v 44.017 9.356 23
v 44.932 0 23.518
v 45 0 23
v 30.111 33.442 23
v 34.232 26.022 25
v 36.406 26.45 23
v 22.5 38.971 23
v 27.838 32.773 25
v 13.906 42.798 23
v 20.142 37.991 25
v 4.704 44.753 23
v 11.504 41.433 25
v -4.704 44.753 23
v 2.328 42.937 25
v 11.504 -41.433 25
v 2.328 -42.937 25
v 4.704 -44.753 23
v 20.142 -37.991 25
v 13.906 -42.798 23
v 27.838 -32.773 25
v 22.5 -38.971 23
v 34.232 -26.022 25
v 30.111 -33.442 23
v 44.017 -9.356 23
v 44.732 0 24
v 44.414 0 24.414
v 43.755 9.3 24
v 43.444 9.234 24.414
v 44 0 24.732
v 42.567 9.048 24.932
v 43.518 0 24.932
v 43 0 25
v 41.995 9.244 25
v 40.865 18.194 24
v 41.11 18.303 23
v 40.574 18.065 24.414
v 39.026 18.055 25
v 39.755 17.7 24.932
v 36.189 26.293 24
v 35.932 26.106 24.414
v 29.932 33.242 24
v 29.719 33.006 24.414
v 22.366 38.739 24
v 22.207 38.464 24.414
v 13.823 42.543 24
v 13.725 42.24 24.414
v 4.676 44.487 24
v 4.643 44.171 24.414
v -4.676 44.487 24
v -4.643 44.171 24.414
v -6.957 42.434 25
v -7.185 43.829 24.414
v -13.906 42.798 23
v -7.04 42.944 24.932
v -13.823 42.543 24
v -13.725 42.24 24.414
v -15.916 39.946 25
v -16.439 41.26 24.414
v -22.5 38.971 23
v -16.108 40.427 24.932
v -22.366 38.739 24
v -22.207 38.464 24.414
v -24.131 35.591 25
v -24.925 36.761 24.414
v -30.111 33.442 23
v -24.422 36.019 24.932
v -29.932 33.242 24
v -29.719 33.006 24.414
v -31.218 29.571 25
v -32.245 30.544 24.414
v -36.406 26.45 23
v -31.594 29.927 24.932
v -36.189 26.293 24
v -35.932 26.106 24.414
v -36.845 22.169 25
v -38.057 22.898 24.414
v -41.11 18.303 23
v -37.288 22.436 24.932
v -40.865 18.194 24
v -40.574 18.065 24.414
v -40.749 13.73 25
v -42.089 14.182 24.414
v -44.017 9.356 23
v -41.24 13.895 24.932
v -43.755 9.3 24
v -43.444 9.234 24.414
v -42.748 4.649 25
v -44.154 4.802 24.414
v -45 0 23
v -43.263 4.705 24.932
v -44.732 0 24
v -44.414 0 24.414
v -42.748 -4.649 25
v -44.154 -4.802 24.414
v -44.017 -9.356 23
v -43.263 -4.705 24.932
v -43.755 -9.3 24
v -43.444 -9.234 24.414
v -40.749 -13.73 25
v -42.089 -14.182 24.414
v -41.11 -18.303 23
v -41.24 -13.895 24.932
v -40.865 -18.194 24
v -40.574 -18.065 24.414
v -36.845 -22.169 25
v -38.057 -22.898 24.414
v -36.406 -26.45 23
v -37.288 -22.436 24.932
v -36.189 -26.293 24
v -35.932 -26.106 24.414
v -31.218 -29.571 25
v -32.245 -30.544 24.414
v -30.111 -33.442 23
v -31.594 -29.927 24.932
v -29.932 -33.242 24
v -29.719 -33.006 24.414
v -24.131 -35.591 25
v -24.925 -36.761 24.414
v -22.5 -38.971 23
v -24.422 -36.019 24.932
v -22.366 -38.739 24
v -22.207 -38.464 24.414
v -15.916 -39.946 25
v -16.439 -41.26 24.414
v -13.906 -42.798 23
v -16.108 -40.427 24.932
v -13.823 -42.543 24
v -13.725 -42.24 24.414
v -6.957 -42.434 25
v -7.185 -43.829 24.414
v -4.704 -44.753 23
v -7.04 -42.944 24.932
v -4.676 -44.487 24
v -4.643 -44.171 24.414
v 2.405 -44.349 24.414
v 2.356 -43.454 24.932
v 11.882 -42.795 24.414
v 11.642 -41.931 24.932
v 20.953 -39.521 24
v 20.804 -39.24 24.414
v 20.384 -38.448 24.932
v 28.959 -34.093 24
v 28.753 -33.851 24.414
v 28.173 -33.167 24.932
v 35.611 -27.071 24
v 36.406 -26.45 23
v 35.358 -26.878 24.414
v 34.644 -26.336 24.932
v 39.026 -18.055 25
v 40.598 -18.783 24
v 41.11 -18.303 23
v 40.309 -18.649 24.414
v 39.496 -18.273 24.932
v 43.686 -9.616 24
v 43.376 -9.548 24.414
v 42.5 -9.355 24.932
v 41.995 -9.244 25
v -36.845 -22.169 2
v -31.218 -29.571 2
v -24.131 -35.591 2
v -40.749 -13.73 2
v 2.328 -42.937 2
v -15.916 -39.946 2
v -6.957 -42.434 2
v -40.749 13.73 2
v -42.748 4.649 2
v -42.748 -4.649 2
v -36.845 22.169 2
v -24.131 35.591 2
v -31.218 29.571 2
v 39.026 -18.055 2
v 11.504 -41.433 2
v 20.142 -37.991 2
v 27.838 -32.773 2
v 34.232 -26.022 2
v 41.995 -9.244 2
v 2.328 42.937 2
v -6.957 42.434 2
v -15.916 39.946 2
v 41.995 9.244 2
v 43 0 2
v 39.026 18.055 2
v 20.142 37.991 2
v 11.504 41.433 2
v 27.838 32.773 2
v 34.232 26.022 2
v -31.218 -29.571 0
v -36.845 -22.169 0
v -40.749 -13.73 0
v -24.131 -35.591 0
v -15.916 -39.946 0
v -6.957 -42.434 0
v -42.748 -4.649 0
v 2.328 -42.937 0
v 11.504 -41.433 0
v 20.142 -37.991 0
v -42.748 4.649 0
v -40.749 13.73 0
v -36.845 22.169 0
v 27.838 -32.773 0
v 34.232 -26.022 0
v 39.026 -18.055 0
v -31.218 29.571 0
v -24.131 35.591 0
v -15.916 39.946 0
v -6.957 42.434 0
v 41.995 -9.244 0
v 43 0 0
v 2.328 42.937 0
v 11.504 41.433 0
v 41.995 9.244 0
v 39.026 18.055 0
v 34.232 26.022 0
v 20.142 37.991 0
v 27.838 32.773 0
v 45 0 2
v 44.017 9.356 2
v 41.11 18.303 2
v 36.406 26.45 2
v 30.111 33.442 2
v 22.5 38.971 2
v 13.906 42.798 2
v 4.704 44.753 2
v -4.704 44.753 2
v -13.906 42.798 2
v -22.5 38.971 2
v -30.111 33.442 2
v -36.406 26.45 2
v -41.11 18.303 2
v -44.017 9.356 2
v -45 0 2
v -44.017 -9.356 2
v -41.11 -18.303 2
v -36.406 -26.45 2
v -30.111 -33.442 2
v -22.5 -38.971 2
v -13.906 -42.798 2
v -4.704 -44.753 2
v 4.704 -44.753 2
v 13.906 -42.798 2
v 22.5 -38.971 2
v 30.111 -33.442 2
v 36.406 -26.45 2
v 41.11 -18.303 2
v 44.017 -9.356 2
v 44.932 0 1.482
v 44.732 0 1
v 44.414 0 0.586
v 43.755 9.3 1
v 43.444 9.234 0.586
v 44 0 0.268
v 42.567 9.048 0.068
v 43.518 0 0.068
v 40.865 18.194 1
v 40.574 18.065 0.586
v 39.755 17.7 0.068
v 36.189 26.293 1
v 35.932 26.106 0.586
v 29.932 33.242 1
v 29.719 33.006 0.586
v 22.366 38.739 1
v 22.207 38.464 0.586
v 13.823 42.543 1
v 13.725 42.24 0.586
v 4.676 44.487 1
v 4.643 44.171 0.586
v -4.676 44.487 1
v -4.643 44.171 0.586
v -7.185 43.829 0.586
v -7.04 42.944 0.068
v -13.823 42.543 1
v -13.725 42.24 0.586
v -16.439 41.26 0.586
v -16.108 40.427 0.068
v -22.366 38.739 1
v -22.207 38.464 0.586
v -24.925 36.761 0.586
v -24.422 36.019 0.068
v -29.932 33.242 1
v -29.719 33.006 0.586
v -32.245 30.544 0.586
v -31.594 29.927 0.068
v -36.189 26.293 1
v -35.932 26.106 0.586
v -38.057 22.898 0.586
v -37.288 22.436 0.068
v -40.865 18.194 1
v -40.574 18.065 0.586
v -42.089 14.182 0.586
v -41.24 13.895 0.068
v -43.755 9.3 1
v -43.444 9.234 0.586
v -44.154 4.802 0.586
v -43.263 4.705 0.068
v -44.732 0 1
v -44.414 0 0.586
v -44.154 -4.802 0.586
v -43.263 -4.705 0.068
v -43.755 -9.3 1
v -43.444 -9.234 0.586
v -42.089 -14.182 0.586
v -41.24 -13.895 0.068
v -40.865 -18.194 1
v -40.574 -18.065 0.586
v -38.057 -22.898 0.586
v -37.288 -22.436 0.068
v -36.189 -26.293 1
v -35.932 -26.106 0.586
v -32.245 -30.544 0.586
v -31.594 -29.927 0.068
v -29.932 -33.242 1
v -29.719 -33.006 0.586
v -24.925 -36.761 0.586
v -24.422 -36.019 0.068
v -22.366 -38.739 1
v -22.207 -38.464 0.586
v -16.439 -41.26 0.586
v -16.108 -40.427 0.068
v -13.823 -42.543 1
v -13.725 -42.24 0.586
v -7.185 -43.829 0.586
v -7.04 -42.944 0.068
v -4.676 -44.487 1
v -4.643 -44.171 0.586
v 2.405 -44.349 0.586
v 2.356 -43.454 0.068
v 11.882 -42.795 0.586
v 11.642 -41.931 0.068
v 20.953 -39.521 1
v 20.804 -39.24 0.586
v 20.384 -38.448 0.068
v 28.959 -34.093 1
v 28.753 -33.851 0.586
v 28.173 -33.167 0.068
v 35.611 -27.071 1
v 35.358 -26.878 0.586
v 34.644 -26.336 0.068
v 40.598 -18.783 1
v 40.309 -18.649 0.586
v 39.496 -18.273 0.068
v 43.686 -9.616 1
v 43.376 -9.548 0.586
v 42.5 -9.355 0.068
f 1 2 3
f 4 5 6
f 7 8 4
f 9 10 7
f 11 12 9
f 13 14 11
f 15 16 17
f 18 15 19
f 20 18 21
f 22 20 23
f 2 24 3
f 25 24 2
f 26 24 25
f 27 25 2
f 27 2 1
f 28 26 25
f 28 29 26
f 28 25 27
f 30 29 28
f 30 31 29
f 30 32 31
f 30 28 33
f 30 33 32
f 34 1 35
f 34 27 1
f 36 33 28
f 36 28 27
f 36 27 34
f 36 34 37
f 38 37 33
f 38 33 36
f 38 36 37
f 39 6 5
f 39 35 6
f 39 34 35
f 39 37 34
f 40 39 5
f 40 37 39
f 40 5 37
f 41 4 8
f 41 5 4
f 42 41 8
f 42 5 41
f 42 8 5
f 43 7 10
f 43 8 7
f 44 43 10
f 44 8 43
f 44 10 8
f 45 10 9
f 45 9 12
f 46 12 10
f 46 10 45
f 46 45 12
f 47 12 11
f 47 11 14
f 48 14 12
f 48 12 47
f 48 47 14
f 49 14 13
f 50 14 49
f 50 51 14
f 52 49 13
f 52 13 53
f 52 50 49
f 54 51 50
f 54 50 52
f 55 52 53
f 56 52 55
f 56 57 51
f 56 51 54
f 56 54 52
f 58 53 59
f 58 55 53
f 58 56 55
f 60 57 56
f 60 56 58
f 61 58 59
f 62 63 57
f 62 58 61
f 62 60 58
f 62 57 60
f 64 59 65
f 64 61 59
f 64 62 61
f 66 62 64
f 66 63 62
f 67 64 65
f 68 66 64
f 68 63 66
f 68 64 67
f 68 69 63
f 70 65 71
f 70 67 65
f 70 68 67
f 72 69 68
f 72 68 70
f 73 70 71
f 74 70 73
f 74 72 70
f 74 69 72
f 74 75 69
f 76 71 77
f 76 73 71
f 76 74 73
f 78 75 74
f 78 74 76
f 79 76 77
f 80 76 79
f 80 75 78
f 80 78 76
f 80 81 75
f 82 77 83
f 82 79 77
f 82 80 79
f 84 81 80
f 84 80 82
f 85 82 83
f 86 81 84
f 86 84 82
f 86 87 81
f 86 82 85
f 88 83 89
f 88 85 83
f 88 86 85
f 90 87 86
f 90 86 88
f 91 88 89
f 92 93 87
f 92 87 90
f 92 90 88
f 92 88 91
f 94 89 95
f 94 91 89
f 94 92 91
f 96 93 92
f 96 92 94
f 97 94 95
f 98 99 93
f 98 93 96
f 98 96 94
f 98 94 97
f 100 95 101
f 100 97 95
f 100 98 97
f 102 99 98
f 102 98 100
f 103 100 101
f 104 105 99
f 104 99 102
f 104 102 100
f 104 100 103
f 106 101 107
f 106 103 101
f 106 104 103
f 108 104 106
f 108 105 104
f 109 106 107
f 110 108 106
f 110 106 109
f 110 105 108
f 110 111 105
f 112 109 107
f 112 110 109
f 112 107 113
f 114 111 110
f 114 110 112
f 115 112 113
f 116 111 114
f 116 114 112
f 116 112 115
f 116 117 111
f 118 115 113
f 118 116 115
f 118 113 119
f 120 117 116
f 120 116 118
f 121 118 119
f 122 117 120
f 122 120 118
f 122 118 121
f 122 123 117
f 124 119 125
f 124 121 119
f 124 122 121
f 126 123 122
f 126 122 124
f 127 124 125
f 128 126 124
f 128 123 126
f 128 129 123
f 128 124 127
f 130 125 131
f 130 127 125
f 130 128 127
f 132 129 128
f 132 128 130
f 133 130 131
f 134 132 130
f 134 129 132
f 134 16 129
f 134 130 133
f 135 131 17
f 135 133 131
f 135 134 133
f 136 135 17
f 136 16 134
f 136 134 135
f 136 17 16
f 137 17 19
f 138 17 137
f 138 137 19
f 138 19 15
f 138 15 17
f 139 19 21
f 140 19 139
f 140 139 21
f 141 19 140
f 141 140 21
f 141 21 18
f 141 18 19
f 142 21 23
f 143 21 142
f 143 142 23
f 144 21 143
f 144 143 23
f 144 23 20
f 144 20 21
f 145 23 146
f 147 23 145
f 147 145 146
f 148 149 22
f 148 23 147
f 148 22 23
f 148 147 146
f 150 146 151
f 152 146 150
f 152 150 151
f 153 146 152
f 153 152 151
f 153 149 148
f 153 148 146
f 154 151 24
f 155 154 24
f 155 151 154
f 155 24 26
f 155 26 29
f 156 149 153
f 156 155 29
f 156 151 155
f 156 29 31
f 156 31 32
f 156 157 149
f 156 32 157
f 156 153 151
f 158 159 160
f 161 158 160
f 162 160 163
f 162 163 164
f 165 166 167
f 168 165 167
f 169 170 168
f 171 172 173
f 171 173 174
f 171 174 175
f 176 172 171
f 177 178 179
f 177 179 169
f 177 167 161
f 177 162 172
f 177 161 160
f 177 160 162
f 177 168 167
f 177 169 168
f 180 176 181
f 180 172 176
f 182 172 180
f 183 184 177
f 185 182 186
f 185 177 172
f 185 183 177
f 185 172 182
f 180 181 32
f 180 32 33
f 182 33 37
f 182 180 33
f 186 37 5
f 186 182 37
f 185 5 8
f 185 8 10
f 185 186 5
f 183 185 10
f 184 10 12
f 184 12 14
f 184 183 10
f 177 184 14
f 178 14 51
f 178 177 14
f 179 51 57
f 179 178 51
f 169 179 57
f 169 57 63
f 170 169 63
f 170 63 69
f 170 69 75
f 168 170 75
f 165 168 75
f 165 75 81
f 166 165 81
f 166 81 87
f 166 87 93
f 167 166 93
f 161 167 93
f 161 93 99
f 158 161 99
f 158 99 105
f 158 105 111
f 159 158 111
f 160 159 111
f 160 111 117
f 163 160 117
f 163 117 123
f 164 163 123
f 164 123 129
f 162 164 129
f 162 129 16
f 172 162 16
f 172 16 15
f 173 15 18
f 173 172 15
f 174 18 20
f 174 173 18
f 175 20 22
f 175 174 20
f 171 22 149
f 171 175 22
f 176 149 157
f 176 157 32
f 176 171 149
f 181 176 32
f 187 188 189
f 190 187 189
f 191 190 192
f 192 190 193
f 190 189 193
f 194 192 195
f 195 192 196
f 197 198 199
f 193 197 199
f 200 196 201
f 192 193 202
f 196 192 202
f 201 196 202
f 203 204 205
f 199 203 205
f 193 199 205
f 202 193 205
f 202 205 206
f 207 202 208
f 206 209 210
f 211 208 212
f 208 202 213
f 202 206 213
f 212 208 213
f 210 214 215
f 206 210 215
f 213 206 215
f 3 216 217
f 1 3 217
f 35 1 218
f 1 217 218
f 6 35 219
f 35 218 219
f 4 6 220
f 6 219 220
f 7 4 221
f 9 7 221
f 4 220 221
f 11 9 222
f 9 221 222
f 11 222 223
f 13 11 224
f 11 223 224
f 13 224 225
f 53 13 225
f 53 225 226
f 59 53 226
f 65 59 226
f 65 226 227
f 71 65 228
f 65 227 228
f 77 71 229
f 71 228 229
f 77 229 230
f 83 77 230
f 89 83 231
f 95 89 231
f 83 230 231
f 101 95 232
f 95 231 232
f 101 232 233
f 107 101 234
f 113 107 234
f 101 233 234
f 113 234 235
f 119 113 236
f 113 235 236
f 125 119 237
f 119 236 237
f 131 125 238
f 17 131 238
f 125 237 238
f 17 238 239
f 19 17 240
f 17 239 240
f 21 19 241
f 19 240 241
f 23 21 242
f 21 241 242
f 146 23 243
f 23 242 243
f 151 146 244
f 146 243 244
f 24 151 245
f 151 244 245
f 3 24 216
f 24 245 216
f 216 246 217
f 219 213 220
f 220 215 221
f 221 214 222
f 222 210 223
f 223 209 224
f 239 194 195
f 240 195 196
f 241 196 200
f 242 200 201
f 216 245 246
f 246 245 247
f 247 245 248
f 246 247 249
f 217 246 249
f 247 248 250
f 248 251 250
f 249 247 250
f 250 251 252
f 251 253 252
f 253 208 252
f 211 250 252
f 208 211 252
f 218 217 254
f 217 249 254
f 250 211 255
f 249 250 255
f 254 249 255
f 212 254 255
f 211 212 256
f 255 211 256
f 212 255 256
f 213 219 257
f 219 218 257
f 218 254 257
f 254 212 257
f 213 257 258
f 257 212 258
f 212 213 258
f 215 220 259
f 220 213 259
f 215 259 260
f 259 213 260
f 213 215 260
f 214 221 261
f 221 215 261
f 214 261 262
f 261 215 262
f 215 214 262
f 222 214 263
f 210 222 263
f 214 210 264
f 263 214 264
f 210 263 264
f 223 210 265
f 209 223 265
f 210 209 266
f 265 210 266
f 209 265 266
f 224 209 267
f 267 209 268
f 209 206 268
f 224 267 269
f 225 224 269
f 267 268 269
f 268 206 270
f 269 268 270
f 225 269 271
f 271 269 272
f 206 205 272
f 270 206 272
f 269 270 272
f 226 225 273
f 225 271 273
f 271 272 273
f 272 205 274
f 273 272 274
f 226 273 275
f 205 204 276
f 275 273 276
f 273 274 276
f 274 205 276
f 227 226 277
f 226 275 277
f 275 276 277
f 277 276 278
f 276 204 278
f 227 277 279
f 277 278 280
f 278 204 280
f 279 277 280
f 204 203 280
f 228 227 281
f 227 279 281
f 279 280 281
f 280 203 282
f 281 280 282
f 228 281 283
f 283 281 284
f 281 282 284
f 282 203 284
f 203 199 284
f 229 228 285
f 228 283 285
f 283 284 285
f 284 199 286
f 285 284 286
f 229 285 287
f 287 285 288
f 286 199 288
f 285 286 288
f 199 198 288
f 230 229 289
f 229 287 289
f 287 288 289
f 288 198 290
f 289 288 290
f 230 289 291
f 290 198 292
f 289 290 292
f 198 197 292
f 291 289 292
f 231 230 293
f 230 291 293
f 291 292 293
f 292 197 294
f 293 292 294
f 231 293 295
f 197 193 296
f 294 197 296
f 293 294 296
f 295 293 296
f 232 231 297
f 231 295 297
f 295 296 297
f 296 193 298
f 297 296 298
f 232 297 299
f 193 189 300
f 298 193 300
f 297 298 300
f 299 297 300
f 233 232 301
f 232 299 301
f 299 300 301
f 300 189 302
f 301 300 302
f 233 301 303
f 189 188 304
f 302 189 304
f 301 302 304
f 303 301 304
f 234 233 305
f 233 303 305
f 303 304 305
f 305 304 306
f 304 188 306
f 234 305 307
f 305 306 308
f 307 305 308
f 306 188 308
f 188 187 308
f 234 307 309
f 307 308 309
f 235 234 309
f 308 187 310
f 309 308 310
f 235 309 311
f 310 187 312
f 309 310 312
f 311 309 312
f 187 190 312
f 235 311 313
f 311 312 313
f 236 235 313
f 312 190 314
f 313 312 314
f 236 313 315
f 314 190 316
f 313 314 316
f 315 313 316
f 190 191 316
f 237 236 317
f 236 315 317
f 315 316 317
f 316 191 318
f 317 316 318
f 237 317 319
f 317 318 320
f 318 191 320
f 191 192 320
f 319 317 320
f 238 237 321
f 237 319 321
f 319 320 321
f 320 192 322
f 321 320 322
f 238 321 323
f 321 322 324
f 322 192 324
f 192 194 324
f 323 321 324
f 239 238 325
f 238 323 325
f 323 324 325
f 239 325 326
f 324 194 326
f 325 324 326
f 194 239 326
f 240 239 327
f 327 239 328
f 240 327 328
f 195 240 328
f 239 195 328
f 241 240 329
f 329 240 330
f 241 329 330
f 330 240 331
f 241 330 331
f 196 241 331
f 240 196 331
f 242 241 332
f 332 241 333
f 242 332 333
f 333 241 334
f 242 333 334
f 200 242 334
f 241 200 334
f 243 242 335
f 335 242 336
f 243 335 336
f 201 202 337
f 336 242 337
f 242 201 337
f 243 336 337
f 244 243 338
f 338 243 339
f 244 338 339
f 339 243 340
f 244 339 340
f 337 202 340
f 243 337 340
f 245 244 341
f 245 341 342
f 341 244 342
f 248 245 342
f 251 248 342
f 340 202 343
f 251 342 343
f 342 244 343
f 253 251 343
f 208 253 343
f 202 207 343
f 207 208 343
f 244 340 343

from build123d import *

# Parameters (mm, degrees)
F0_R     = 43
F1_DEPTH = 2
F0_R_2   = 45
F2_DEPTH = 25
F3_R     = 1.99999


# Not quite as in the source:
# - a fillet or chamfer is up to 0.001 mm smaller than in the source, because OpenCascade refuses the exact size


with BuildPart() as f1:
    # F0 (on Top) → F1 (new body)
    with BuildSketch(Plane.XY):
        Circle(F0_R)
    extrude(amount=F1_DEPTH)

    # F0 (on Top) → F2 (join)
    with BuildSketch(Plane.XY):
        Circle(F0_R_2)
        Circle(F0_R, mode=Mode.SUBTRACT)
    extrude(amount=F2_DEPTH)

    # F3 (radius 2 in the source; OpenCascade refuses exactly that, so slightly less here)
    f3_edges = [f1.edges().sort_by_distance(p)[0] for p in [
        (-45, 0, 0),
        (-45, 0, 25),
    ]]
    fillet(f3_edges, radius=F3_R)


solid = f1.part
